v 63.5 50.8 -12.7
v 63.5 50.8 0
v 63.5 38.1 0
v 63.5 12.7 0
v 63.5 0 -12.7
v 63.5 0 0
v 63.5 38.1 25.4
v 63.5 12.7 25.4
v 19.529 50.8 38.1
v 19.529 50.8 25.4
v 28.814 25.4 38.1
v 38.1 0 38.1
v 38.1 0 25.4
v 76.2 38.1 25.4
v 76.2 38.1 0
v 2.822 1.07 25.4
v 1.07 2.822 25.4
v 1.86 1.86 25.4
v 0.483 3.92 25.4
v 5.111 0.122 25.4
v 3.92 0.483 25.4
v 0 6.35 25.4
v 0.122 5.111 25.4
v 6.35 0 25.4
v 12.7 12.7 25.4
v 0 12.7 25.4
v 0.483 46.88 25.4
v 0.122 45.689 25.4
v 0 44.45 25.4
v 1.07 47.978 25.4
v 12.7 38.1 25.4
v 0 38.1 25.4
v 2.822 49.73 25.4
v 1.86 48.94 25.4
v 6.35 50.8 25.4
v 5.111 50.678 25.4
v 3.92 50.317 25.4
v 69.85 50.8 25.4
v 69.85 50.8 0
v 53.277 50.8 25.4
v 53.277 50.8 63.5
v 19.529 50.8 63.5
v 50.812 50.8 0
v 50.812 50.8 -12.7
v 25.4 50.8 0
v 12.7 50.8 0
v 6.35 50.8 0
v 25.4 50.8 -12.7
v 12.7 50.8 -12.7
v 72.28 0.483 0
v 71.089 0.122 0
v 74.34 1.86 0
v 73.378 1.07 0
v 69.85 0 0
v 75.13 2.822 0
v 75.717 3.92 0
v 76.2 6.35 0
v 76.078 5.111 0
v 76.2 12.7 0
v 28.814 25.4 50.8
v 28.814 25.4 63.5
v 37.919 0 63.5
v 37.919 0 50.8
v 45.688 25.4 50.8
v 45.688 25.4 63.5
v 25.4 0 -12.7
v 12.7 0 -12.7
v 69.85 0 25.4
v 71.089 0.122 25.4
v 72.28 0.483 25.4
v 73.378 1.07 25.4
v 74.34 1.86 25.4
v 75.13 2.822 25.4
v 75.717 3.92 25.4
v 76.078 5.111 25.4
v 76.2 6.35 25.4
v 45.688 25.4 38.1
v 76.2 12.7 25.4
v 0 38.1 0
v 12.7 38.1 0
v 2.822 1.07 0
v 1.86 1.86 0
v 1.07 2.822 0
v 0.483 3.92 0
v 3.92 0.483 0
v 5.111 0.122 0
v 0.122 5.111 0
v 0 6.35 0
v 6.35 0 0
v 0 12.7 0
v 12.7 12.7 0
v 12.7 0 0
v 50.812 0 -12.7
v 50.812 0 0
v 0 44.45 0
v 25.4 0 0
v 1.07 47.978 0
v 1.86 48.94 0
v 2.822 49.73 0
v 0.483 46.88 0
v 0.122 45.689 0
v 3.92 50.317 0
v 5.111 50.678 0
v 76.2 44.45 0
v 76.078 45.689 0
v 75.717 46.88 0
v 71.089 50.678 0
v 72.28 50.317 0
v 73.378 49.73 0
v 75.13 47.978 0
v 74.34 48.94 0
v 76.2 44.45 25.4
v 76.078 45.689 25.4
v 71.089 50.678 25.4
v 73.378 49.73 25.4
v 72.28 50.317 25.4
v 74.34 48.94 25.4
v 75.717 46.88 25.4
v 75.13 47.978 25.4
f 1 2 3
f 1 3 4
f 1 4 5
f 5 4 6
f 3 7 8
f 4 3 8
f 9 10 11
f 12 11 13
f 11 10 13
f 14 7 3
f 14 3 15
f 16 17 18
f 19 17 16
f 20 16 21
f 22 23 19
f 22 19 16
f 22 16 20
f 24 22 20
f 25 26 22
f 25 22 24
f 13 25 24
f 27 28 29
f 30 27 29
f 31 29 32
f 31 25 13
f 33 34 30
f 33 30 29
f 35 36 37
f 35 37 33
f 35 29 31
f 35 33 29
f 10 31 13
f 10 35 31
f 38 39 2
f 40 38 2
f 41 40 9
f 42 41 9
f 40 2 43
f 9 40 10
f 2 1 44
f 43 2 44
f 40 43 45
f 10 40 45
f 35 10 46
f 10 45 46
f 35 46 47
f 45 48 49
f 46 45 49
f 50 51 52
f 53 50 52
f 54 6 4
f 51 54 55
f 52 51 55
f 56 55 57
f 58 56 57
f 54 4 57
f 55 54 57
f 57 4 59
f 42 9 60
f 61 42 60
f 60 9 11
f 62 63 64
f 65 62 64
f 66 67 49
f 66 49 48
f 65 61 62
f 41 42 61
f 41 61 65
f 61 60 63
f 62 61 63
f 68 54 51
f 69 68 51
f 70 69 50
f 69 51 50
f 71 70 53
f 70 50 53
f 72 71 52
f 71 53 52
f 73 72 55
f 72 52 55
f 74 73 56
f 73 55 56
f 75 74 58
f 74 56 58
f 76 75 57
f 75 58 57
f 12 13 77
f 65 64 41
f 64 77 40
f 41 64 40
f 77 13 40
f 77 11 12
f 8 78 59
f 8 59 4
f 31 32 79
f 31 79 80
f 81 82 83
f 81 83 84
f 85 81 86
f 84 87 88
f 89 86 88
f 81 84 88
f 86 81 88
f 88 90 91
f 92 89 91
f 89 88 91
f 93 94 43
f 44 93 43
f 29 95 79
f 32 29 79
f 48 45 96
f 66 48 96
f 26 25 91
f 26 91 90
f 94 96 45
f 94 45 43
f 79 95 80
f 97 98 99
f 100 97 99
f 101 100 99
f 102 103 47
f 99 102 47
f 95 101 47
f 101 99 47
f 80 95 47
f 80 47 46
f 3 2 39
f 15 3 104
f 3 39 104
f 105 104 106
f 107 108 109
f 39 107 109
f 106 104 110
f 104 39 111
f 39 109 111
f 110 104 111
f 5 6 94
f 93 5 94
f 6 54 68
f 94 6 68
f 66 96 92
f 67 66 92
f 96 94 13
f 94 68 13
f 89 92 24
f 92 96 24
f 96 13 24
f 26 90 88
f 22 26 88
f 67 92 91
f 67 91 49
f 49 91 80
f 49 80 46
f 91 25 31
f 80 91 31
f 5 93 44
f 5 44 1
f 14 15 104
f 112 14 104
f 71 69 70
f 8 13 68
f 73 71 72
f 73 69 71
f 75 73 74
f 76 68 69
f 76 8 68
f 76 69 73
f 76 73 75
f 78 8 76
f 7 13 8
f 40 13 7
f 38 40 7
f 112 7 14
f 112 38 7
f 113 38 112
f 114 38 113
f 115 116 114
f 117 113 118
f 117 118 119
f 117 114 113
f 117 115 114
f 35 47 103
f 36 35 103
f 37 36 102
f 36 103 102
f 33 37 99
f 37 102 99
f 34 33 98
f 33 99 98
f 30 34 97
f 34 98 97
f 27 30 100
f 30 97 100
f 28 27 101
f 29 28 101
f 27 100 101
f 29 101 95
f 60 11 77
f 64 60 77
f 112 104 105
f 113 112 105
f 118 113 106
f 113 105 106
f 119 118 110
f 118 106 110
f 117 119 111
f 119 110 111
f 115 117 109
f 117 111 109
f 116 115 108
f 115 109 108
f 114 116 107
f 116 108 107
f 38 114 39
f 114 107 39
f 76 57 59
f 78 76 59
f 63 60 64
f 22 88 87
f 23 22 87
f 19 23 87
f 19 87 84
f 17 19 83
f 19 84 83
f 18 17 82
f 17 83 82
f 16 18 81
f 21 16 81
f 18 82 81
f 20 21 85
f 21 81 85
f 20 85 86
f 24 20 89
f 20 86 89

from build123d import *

# Parameters (mm, degrees)
F1_DEPTH  = 25.4
F3_DEPTH  = 12.7
F5_DEPTH  = 12.7
F7_DEPTH  = 12.7
F9_DEPTH  = 12.7
F10_DEPTH = 12.7


with BuildPart() as f1:
    # F0 (on Top) → F1 (new body)
    with BuildSketch(Plane.XY):
        with BuildLine():
            ThreePointArc((0, 6.35), (1.8598719395, 1.8598719395), (6.35, 0))
            Line((6.35, 0), (69.85, 0))
            ThreePointArc((69.85, 0), (74.3401280605, 1.8598719395), (76.2, 6.35))
            Line((76.2, 6.35), (76.2, 12.7))
            Line((76.2, 12.7), (63.5, 12.7))
            Line((63.5, 12.7), (63.5, 25.4))
            Line((63.5, 25.4), (63.5, 38.1))
            Line((63.5, 38.1), (76.2, 38.1))
            Line((76.2, 38.1), (76.2, 44.45))
            ThreePointArc((76.2, 44.45), (74.3401280605, 48.9401280605), (69.85, 50.8))
            Line((69.85, 50.8), (6.35, 50.8))
            ThreePointArc((6.35, 50.8), (1.8598719395, 48.9401280605), (0, 44.45))
            Line((0, 44.45), (0, 38.1))
            Line((0, 38.1), (12.7, 38.1))
            Line((12.7, 38.1), (12.7, 25.4))
            Line((12.7, 25.4), (12.7, 12.7))
            Line((12.7, 12.7), (0, 12.7))
            Line((0, 12.7), (0, 6.35))
        make_face()
    extrude(amount=F1_DEPTH)

    # F2 (on face) → F3 (join)
    with BuildSketch(Plane(origin=(0, 0, 0), x_dir=(1, 0, 0), z_dir=(0, 0, -1))):
        Polygon((63.5, -12.7), (63.5, 0), (50.8120395243, 0), (50.8120395243, -50.8), (63.5, -50.8), (63.5, -38.1), align=None)
        Polygon((25.4, -50.8), (25.4, 0), (12.7, 0), (12.7, -12.7), (12.7, -38.1), (12.7, -50.8), align=None)
    extrude(amount=F3_DEPTH)

    # F4 (on face) → F5 (join)
    with BuildSketch(Plane.XY.offset(25.4)):
        Polygon((19.5285081863, 50.8), (38.1, 0), (53.2767996192, 50.8), align=None)
    extrude(amount=F5_DEPTH)

    # F6 (on face) → F7 (join)
    with BuildSketch(Plane.XY.offset(38.1)):
        Polygon((19.5285081863, 50.8), (28.8142540932, 25.4), (45.6883998096, 25.4), (53.2767996192, 50.8), align=None)
    extrude(amount=F7_DEPTH)

    # F10 (add): a face of the model
    f10_faces = [f1.faces().sort_by_distance(p)[0] for p in [
        (36.7798419244, 39.5111111111, 50.8),
    ]]


with BuildPart() as f9:
    # F8 (on face) → F9 (new body)
    with BuildSketch(Plane.XY.offset(50.8)):
        Polygon((45.6883998096, 25.4), (28.8142540932, 25.4), (37.9194319248, 0), align=None)
    extrude(amount=F9_DEPTH)


with BuildPart() as f1_1:
    add(f1.part)

    add(f9.part)  # F10 merges F9
    extrude(f10_faces, amount=F10_DEPTH)


solid = f1_1.part
